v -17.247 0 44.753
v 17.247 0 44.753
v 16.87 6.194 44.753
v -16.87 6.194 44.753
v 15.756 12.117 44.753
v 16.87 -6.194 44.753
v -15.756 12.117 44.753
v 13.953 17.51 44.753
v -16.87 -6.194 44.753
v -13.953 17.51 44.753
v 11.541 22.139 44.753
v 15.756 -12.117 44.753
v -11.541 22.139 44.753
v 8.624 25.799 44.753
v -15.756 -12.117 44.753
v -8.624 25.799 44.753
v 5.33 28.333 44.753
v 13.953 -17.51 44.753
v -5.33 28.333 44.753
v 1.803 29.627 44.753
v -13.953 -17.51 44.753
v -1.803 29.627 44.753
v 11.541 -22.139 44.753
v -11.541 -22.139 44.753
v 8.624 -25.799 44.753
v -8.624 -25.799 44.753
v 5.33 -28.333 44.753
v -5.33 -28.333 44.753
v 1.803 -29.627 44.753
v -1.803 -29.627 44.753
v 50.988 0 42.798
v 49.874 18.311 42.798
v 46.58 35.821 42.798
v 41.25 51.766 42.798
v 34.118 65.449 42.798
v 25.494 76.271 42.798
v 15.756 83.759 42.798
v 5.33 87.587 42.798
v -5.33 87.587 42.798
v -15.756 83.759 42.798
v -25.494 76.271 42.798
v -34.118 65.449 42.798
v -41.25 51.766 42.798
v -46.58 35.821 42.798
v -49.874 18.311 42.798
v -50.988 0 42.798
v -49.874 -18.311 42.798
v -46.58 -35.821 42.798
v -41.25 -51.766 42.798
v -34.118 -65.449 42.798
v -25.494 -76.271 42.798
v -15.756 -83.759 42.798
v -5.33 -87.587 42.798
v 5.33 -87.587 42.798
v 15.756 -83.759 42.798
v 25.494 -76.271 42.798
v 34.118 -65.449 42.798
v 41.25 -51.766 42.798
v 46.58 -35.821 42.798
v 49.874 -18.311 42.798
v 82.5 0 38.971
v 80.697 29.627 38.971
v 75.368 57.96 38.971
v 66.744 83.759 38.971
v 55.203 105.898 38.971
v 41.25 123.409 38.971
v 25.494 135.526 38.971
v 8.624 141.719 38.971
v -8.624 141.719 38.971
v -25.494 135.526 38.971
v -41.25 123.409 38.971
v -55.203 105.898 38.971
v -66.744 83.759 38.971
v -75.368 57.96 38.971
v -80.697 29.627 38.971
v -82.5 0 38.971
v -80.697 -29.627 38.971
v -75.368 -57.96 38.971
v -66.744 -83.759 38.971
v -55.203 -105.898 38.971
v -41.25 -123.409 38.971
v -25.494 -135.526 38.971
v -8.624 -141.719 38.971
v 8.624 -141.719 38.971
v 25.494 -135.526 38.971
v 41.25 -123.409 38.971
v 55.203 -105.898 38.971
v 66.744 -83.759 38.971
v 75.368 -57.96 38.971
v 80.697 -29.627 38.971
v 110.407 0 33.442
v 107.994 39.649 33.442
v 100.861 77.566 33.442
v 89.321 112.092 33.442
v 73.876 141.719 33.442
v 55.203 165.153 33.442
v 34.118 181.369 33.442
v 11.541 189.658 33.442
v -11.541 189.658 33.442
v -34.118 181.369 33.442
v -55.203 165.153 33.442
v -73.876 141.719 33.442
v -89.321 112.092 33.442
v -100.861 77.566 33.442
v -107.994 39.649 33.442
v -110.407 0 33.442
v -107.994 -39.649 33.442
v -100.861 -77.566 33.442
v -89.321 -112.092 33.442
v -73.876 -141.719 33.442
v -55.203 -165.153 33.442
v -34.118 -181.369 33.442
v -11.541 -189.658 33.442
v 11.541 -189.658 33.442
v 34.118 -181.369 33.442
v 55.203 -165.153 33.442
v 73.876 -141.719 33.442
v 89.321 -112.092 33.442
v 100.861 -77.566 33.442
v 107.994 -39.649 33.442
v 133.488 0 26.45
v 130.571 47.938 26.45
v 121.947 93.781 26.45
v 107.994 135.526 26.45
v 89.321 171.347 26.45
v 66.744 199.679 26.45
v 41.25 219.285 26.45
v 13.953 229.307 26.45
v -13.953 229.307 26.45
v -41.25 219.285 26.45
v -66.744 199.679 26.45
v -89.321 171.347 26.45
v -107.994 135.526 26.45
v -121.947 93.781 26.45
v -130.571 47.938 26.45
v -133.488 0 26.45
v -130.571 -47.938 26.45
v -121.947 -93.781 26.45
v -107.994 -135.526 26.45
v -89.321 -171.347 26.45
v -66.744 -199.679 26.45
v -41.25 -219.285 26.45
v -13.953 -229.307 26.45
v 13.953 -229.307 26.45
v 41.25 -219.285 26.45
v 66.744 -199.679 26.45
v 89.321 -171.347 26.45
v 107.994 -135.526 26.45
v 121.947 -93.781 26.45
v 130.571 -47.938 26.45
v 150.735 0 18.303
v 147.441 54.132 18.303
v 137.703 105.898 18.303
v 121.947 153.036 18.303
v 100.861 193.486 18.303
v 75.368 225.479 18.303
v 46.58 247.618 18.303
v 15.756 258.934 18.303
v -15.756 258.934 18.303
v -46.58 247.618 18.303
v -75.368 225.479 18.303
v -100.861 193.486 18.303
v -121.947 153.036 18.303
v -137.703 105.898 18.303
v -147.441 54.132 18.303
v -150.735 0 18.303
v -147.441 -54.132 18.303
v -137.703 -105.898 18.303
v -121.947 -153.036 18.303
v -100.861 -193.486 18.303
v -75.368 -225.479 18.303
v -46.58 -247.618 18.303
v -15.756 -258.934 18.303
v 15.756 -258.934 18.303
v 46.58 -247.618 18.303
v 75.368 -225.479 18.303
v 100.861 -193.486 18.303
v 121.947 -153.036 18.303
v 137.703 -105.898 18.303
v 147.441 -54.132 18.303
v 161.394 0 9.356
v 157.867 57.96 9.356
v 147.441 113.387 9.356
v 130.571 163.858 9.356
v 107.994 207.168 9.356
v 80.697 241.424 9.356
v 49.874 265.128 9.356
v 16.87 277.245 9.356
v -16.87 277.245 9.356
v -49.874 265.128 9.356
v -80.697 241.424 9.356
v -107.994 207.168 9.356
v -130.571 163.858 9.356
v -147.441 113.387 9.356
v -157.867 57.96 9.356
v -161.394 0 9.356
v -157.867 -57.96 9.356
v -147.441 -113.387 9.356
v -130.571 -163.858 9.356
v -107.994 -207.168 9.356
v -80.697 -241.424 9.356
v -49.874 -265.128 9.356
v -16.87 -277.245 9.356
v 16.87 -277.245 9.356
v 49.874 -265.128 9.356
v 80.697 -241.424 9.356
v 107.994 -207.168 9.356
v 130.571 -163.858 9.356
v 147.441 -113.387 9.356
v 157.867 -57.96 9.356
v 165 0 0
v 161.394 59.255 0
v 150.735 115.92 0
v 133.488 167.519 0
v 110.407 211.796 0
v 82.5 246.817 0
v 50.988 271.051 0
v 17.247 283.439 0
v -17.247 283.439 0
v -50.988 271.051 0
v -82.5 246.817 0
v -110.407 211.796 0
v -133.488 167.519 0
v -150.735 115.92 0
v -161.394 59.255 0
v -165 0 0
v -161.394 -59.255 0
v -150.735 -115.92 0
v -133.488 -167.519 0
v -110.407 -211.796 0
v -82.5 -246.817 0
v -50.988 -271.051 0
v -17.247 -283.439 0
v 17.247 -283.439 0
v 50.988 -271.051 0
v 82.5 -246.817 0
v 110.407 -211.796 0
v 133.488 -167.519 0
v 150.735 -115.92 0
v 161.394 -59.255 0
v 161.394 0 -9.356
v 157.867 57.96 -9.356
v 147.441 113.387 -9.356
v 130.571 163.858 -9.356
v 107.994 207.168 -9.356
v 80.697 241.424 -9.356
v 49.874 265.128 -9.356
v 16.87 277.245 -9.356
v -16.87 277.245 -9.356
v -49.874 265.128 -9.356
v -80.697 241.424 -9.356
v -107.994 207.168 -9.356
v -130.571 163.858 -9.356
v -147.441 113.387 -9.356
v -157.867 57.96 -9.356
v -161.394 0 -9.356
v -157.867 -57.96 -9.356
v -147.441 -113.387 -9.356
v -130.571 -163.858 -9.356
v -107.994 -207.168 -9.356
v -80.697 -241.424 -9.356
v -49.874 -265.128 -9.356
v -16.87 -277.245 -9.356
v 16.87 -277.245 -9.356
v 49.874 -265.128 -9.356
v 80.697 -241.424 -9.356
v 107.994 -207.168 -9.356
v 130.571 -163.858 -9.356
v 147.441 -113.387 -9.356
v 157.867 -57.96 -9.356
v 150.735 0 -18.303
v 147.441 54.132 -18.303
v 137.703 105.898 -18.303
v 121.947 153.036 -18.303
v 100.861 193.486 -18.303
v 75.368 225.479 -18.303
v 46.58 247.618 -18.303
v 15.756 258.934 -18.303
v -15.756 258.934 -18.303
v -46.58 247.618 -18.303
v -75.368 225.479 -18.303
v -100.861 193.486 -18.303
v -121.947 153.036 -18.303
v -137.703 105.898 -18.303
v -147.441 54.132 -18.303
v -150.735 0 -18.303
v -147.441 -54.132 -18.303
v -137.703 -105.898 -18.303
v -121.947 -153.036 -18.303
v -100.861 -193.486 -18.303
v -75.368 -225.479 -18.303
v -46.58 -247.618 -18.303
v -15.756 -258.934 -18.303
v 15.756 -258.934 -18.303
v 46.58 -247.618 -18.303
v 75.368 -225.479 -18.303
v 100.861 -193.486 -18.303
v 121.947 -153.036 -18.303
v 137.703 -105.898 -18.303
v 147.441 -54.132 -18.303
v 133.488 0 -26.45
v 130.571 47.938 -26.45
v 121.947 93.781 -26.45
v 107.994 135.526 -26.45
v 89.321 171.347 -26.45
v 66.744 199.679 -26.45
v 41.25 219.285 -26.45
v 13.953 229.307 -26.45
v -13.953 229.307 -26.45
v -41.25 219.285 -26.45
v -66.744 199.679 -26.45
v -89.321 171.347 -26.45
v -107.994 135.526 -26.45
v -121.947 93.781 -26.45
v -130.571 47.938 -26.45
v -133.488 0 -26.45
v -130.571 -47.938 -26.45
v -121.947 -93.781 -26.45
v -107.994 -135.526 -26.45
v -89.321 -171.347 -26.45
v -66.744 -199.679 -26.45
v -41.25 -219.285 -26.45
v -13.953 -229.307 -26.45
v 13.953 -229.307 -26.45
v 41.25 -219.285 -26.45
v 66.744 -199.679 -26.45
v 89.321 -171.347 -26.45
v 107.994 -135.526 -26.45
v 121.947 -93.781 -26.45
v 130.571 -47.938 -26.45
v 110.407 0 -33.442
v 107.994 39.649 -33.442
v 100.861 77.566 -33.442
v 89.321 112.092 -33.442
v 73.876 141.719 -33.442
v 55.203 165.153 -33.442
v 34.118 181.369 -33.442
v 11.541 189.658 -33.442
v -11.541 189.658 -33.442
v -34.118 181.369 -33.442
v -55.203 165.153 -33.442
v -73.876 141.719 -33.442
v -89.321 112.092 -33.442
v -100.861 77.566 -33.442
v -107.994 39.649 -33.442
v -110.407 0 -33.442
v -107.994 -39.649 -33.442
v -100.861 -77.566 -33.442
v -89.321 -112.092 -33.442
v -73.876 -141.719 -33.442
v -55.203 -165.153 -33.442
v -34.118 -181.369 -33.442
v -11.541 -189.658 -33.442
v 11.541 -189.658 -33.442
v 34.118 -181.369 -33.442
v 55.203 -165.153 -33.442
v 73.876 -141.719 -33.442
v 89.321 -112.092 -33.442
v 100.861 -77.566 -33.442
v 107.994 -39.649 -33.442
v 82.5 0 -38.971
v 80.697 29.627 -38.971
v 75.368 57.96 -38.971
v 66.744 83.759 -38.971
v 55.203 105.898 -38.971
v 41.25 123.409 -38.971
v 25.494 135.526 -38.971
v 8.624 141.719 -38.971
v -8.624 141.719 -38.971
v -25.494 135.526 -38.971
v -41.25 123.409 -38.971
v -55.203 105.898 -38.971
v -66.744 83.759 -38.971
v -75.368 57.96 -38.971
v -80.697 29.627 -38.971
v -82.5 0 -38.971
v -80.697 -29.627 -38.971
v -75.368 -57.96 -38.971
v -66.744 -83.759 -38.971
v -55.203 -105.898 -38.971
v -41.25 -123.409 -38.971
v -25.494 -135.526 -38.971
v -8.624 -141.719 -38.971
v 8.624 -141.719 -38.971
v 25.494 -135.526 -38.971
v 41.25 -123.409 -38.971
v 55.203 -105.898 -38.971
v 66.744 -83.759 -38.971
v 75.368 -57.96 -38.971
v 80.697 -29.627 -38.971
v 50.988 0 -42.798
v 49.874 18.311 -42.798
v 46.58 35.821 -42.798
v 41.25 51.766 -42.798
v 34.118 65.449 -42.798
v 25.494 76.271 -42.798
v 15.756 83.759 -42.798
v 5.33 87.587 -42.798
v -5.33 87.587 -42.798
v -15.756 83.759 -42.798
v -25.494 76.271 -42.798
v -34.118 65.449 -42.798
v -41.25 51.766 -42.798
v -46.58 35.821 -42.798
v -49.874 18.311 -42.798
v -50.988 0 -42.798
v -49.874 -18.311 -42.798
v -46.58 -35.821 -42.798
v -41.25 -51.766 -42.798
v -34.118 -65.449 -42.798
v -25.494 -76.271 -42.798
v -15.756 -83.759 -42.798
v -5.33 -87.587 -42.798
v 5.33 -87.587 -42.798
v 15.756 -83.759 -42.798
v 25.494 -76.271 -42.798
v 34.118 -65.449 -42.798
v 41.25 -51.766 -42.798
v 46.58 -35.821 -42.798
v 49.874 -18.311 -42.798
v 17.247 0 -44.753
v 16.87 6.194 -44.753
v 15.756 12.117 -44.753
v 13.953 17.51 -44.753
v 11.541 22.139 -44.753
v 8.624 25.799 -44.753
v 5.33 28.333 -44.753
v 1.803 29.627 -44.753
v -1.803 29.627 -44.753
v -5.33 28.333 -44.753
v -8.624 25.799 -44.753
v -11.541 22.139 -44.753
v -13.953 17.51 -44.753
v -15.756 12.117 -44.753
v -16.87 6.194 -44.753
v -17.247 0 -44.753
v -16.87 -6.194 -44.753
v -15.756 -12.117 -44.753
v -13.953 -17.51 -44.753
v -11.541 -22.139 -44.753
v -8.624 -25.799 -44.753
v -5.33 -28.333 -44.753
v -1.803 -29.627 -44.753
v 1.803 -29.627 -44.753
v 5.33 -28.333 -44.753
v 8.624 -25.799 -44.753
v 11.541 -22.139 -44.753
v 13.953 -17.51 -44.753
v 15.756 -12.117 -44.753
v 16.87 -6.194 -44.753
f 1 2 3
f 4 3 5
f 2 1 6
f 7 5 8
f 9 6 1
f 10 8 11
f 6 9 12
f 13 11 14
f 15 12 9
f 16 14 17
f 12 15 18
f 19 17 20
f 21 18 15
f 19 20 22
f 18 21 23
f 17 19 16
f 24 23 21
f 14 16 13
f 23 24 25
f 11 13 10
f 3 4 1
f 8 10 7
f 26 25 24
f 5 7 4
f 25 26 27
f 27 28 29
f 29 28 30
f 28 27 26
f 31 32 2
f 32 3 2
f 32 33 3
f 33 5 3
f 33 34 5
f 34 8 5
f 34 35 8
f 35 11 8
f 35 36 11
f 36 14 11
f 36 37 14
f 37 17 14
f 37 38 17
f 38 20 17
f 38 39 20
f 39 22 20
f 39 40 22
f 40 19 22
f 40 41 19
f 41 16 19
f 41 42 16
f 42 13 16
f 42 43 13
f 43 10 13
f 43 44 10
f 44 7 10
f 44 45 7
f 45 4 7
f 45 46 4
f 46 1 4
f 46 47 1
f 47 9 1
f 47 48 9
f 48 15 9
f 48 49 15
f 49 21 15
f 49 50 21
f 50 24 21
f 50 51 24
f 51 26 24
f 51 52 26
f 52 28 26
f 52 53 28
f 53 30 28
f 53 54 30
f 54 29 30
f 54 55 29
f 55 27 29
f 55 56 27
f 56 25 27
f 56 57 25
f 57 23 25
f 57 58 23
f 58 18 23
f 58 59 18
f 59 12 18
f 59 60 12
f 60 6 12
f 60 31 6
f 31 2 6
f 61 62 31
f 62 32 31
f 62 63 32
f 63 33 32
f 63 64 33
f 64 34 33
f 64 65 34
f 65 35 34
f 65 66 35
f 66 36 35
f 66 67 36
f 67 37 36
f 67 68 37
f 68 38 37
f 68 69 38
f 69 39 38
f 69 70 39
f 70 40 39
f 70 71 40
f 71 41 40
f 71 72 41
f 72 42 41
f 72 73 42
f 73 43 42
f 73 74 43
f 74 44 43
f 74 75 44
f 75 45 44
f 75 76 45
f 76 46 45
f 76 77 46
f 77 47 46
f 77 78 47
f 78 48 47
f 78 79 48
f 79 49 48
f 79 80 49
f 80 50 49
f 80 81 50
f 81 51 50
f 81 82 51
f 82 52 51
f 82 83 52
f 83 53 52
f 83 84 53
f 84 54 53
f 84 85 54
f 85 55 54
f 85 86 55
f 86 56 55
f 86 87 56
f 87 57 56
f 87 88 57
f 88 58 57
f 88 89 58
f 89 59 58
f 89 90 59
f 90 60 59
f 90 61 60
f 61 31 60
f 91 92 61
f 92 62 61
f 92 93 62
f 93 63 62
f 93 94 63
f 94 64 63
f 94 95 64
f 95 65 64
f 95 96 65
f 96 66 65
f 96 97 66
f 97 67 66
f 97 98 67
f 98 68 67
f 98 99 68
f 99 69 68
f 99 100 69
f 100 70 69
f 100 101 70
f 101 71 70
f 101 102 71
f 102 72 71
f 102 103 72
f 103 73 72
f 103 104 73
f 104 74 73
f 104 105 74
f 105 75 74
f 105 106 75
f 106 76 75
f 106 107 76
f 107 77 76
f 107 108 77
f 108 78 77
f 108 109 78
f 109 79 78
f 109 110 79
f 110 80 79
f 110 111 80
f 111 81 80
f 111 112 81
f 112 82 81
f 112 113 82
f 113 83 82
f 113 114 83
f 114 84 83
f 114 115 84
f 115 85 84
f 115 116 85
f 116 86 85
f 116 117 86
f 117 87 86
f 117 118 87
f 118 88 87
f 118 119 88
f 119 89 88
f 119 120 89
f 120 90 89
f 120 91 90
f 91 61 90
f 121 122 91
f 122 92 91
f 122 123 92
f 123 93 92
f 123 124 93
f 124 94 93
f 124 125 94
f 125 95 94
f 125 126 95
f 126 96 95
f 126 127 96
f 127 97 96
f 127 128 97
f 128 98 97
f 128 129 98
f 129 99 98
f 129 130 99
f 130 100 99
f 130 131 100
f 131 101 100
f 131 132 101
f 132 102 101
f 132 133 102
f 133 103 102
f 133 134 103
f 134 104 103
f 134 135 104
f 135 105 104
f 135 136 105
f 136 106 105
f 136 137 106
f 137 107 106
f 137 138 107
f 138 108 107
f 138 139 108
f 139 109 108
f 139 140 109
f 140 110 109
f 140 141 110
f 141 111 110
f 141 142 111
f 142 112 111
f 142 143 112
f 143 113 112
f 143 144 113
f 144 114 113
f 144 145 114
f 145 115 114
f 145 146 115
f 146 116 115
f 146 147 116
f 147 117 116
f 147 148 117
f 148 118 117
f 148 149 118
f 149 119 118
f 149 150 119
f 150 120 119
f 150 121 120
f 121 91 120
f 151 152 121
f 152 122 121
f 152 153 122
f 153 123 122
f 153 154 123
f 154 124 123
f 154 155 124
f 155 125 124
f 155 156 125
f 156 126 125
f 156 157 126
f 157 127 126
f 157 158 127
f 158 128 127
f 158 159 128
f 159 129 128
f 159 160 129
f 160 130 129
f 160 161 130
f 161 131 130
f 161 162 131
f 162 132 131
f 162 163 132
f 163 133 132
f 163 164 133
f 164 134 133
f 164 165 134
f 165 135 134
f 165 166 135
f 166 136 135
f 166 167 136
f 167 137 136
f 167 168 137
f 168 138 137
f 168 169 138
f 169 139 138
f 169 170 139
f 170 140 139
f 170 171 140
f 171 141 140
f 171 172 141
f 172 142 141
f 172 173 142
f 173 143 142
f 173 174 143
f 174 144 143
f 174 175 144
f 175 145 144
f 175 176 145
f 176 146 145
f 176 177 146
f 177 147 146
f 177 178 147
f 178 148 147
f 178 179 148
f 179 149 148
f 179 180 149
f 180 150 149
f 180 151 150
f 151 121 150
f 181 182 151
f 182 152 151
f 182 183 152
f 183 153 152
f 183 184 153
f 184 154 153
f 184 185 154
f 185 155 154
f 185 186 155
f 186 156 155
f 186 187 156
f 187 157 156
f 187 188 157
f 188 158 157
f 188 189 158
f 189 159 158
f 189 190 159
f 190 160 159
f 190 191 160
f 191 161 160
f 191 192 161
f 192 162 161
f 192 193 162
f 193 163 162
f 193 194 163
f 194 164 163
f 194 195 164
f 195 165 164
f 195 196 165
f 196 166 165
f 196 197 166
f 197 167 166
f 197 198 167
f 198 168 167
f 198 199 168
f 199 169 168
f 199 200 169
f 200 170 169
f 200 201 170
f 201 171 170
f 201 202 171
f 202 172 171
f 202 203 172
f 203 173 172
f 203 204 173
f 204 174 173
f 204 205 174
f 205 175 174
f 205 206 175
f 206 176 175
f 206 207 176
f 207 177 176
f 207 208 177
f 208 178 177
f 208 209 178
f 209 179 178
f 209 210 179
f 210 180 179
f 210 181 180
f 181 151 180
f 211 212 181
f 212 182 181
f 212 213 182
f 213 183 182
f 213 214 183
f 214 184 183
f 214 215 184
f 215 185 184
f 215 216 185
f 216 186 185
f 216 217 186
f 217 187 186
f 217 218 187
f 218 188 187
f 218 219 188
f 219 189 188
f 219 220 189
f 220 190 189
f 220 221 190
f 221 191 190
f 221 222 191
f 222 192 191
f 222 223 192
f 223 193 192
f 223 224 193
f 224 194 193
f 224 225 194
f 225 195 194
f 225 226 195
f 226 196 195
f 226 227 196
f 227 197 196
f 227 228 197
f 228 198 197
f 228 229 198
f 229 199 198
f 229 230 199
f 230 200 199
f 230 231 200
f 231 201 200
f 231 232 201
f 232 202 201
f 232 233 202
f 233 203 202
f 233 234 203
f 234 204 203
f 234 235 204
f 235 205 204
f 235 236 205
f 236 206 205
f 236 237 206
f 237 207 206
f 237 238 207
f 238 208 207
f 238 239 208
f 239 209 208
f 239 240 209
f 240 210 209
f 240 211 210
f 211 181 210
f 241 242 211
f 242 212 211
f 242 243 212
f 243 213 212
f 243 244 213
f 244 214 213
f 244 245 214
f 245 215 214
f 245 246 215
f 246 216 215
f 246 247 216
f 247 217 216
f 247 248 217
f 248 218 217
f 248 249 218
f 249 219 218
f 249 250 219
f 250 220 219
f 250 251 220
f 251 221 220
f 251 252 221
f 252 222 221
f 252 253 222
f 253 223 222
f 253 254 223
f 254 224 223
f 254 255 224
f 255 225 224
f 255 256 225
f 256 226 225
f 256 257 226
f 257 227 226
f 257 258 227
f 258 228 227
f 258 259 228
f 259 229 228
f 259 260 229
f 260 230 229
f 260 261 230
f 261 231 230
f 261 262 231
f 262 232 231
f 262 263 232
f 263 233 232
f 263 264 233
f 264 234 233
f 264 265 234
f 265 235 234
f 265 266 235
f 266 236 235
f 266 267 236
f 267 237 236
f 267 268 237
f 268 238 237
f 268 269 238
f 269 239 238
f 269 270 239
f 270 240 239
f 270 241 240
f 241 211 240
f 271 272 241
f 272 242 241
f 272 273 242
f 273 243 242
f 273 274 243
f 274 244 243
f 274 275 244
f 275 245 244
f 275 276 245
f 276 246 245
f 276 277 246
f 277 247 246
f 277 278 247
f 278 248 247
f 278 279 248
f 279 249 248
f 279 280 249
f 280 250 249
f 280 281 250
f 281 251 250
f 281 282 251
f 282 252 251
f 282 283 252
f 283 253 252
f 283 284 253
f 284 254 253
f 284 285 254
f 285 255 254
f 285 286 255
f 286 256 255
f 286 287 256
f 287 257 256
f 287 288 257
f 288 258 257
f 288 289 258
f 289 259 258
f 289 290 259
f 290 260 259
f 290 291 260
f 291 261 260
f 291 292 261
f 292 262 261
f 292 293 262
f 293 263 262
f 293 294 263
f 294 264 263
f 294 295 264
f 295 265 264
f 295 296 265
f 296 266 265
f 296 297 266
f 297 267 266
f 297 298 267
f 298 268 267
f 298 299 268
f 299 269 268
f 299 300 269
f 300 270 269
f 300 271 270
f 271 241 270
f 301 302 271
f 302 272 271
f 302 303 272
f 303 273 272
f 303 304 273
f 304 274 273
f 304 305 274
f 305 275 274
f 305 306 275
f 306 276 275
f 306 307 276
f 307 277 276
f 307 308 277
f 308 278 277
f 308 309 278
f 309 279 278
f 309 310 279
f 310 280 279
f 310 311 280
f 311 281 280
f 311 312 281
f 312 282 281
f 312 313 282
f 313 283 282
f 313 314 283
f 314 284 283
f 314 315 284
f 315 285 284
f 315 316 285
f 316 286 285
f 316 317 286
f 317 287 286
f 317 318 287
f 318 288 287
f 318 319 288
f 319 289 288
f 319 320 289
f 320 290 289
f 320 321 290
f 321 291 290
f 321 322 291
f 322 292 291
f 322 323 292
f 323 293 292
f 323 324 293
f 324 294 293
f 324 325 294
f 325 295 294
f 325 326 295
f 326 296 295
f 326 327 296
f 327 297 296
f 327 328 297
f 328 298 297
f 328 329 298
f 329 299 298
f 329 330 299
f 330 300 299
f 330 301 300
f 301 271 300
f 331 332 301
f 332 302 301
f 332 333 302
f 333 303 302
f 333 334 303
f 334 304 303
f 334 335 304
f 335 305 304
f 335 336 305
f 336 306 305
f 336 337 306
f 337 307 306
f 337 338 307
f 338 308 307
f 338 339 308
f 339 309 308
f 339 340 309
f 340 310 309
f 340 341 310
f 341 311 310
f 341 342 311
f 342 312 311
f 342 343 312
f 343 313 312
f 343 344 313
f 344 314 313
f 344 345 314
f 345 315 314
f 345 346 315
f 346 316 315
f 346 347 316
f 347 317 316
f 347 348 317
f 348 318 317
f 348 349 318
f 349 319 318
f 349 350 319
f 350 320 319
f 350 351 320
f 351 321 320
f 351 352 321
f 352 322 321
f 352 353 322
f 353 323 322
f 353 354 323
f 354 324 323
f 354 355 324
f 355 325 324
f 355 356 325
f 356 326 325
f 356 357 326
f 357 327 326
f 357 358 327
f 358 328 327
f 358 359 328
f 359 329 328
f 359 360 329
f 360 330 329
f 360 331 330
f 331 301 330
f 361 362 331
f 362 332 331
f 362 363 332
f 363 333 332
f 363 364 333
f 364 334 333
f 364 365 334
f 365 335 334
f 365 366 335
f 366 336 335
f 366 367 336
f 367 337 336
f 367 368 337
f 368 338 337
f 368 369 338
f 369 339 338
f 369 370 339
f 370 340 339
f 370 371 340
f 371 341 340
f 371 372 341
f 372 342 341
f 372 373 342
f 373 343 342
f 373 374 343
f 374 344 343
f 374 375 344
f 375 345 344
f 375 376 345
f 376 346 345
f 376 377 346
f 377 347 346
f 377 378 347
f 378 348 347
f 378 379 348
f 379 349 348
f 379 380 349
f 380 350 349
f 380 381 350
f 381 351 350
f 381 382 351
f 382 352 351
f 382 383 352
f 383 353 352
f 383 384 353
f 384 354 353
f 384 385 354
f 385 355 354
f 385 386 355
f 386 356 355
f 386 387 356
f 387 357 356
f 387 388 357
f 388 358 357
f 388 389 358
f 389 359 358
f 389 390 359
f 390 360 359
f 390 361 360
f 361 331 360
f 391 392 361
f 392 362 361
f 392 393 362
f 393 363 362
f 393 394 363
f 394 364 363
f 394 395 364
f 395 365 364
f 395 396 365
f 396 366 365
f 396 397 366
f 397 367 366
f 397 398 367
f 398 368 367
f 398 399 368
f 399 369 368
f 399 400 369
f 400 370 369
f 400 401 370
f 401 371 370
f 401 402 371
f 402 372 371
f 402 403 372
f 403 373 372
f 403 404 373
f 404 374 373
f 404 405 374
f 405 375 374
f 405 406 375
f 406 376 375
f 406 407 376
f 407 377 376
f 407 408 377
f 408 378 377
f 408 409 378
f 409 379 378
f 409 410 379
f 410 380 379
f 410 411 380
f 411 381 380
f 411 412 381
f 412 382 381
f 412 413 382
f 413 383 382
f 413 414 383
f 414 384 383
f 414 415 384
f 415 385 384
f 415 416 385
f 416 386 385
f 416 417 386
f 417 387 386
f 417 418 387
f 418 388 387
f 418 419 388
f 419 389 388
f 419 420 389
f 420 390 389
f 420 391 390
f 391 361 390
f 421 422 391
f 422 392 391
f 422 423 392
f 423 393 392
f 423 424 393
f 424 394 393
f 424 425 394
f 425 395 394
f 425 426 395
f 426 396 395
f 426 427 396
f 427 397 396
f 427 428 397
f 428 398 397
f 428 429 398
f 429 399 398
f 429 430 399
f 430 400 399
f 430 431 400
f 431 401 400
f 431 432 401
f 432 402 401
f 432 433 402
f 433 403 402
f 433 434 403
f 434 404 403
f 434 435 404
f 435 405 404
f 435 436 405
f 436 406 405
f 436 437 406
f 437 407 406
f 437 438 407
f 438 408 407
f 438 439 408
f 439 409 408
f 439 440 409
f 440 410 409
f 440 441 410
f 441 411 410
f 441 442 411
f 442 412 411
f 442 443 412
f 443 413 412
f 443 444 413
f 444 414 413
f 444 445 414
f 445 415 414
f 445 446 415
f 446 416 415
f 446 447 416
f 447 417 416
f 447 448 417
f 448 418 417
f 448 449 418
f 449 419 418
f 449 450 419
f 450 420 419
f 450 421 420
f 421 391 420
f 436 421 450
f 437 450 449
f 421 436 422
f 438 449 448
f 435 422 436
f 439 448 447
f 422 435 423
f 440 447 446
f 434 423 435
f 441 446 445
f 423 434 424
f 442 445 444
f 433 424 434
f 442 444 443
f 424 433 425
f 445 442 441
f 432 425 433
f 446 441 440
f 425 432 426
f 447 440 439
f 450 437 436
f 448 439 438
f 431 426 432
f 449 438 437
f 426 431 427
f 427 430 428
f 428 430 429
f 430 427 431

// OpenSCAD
// Generated by SolidPython 1.0.1 on 2020-07-29 00:46:50


scale(v = [11, 19, 3]) {
	sphere(r = 15);
}
/***********************************************
*********      SolidPython code:      **********
************************************************
 
# import packages: SolidPython
from solid import *
from solid.utils import *
from itertools import chain, combinations, permutations


class Resize:

    def __init__(self, scad_file):
        self.scad_file = scad_file
        #self.scad_file = import_scad(scad_file)
        # cone/cylinder param:
        self.r1 = 0
        self.r2 = 0
        self.h = 0
        # rectangular prism param:
        self.w = 0
        self.l = 0
        # ellipse param:
        self.r = 0

    # import OpenScad code (file name corresponds to shape)


    # classify shape + parameters
    def assign(self, param1, param2, param3):
        if self.scad_file == 'cone.scad':
            self.r1 = param1
            self.r2 = param2
            self.h = param3
        elif self.scad_file == 'cylinder.scad':
            self.r1 = param1
            self.r2 = param2
            self.h = param3
        elif self.scad_file == 'rectangularPrism.scad':
            self.h = param1
            self.l = param2
            self.w = param3
        else:
            self.r = param1
            self.h = param2

    # resize parameters
    def iterate(self):
        x = range(3, 20, 2)
        i = 1
        if self.scad_file == 'cone.scad':
            tempList = list(permutations(x, 2))
            for temp in tempList:
                param1 = temp[0]
                param2 = temp[1]
                filepath = 'produced_scad_files/' + 'cone' + str(param1) + '_' + str(param2) + '_' + '.scad'
                scad_render_to_file(cylinder(h=param1, r1=param2, r2=0), filepath)

        elif self.scad_file == 'cylinder.scad':
            tempList = list(permutations(x, 3))
            for temp in tempList:
                param1 = temp[0]
                param2 = temp[1]
                filepath = 'produced_scad_files/' + 'cylinder' + str(param1) + '_' + str(param2) + '_' + '.scad'
                scad_render_to_file(cylinder(h=param1, r1=param2, r2=param2), filepath)

        elif self.scad_file == 'rectangularPrism.scad':
            tempList = list(permutations(x, 3))
            for temp in tempList:
                param1 = temp[0]
                param2 = temp[1]
                param3 = temp[2]
                filepath = 'produced_scad_files/' + 'rectangularPrism' + str(param1) + '_' + str(param2) + '_' + str(
                    param3) + '.scad'
                scad_render_to_file(cube(size=(param1, param2, param3)), filepath)

        elif self.scad_file == 'ellipse.scad':
            tempList = list(permutations(x, 4))
            for temp in tempList:
                param1 = temp[0]
                param2 = temp[1]
                param3 = temp[2]
                param4 = temp[3]
                filepath = 'produced_scad_files/' + 'ellipse' + str(param1) + '_' + str(param2) + '_' + str(param3) + '_' + str(param4) + '.scad'
                scad_render_to_file(scale([param1, param2, param3])(sphere(r=param4)), filepath)

    def render_to_scadfile(self):
        scad_render_to_file(scad, 'example.scad') 
 
************************************************/
